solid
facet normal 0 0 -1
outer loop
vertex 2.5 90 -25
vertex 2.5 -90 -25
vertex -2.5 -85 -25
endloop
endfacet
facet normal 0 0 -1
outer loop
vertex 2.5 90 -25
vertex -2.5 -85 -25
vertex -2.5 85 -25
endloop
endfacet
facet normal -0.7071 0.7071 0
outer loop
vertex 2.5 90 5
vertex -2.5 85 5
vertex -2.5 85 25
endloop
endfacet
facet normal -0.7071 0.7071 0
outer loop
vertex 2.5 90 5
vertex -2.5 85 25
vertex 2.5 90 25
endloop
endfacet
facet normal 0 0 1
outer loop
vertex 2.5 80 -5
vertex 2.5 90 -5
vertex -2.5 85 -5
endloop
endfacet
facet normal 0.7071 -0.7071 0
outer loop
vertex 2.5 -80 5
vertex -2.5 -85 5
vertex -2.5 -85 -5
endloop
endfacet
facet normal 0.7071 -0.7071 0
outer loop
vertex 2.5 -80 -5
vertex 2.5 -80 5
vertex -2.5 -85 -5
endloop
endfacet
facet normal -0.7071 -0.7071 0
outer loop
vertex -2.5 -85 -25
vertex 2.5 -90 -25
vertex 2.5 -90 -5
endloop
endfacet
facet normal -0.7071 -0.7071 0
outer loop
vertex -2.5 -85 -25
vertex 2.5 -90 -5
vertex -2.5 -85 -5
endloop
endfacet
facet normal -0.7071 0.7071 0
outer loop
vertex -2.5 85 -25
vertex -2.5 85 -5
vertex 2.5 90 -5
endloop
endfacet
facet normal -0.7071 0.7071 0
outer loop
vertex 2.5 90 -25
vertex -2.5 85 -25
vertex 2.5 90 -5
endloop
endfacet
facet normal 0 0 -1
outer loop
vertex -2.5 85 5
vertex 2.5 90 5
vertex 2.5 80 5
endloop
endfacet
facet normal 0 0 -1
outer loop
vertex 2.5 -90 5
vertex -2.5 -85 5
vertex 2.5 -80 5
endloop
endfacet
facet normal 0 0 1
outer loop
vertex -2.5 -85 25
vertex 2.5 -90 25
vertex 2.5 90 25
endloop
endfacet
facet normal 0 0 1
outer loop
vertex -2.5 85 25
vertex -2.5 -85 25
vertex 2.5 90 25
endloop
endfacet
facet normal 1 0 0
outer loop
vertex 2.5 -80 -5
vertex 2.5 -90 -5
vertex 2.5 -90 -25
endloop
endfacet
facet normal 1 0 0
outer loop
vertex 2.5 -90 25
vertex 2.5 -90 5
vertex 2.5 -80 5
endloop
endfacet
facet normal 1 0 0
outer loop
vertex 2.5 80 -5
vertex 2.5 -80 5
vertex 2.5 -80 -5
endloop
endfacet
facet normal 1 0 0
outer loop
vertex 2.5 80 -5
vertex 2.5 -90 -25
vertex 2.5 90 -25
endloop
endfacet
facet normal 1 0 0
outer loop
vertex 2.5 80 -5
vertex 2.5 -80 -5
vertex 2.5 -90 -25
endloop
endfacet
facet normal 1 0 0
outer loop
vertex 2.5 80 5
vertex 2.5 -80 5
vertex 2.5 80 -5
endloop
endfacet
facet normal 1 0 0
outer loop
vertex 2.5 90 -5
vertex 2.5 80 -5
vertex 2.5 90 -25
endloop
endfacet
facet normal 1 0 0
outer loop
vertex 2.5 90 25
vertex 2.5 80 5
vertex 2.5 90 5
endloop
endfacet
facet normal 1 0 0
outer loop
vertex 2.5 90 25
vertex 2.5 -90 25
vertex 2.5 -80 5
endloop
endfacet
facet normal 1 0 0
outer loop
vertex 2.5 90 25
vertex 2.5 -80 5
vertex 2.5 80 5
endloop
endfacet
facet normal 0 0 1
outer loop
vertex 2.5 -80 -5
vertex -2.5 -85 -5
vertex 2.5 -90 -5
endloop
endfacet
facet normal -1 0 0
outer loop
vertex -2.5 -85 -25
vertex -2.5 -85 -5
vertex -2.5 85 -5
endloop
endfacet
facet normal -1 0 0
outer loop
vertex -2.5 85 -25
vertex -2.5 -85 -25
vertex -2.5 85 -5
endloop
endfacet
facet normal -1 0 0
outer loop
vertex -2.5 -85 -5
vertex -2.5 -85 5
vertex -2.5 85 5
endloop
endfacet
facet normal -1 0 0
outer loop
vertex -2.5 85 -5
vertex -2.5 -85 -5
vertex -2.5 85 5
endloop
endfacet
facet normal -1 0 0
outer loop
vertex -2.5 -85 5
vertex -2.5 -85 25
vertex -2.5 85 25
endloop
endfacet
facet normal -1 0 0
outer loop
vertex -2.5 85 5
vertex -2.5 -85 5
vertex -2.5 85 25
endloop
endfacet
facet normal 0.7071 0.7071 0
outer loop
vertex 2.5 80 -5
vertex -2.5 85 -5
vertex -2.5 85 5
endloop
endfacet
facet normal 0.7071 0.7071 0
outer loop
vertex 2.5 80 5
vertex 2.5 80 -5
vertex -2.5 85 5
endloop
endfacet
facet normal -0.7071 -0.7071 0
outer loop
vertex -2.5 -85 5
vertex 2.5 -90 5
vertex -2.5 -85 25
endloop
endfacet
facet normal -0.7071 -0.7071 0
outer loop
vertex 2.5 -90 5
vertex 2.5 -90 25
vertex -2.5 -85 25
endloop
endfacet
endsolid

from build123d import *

# Parameters (mm, degrees)
F0_W     = 180
F0_H     = 50
F1_DEPTH = 2.5
F3_DEPTH = 60
F5_DEPTH = 50
F6_W     = 7.071068
F6_H     = 5
F7_DEPTH = 25
F8_W     = 7.071068
F8_H     = 5
F9_DEPTH = 25


with BuildPart() as f1:
    # F0 (on Right) → F1 (new body, symmetric)
    with BuildSketch(Plane.YZ):
        Rectangle(F0_W, F0_H)
    extrude(amount=F1_DEPTH, both=True)

    # F2 (on face) → F3 (cut)
    with BuildSketch(Plane.XY.offset(25)):
        Polygon((-2.5, -85), (-2.5, -90), (2.5, -90), align=None)
    extrude(amount=-F3_DEPTH, mode=Mode.SUBTRACT)

    # F4 (on face) → F5 (cut)
    with BuildSketch(Plane.XY.offset(25)):
        Polygon((2.5, 90), (-2.5, 90), (-2.5, 85), align=None)
    extrude(amount=-F5_DEPTH, mode=Mode.SUBTRACT)

    # F6 (on face) → F7 (cut)
    with BuildSketch(Plane(origin=(-43.75, -43.75, 0), x_dir=(0.707107, -0.707107, 0), z_dir=(-0.707107, -0.707107, 0))):
        with Locations((61.871843, -2.5)):
            Rectangle(F6_W, F6_H)
        with Locations((61.871843, 2.5)):
            Rectangle(F6_W, F6_H)
    extrude(amount=-F7_DEPTH, mode=Mode.SUBTRACT)

    # F8 (on face) → F9 (cut)
    with BuildSketch(Plane(origin=(-43.75, 43.75, 0), x_dir=(-0.707107, -0.707107, 0), z_dir=(-0.707107, 0.707107, 0))):
        with Locations((-61.871843, -2.5)):
            Rectangle(F8_W, F8_H)
        with Locations((-61.871843, 2.5)):
            Rectangle(F8_W, F8_H)
    extrude(amount=-F9_DEPTH, mode=Mode.SUBTRACT)


solid = f1.part
